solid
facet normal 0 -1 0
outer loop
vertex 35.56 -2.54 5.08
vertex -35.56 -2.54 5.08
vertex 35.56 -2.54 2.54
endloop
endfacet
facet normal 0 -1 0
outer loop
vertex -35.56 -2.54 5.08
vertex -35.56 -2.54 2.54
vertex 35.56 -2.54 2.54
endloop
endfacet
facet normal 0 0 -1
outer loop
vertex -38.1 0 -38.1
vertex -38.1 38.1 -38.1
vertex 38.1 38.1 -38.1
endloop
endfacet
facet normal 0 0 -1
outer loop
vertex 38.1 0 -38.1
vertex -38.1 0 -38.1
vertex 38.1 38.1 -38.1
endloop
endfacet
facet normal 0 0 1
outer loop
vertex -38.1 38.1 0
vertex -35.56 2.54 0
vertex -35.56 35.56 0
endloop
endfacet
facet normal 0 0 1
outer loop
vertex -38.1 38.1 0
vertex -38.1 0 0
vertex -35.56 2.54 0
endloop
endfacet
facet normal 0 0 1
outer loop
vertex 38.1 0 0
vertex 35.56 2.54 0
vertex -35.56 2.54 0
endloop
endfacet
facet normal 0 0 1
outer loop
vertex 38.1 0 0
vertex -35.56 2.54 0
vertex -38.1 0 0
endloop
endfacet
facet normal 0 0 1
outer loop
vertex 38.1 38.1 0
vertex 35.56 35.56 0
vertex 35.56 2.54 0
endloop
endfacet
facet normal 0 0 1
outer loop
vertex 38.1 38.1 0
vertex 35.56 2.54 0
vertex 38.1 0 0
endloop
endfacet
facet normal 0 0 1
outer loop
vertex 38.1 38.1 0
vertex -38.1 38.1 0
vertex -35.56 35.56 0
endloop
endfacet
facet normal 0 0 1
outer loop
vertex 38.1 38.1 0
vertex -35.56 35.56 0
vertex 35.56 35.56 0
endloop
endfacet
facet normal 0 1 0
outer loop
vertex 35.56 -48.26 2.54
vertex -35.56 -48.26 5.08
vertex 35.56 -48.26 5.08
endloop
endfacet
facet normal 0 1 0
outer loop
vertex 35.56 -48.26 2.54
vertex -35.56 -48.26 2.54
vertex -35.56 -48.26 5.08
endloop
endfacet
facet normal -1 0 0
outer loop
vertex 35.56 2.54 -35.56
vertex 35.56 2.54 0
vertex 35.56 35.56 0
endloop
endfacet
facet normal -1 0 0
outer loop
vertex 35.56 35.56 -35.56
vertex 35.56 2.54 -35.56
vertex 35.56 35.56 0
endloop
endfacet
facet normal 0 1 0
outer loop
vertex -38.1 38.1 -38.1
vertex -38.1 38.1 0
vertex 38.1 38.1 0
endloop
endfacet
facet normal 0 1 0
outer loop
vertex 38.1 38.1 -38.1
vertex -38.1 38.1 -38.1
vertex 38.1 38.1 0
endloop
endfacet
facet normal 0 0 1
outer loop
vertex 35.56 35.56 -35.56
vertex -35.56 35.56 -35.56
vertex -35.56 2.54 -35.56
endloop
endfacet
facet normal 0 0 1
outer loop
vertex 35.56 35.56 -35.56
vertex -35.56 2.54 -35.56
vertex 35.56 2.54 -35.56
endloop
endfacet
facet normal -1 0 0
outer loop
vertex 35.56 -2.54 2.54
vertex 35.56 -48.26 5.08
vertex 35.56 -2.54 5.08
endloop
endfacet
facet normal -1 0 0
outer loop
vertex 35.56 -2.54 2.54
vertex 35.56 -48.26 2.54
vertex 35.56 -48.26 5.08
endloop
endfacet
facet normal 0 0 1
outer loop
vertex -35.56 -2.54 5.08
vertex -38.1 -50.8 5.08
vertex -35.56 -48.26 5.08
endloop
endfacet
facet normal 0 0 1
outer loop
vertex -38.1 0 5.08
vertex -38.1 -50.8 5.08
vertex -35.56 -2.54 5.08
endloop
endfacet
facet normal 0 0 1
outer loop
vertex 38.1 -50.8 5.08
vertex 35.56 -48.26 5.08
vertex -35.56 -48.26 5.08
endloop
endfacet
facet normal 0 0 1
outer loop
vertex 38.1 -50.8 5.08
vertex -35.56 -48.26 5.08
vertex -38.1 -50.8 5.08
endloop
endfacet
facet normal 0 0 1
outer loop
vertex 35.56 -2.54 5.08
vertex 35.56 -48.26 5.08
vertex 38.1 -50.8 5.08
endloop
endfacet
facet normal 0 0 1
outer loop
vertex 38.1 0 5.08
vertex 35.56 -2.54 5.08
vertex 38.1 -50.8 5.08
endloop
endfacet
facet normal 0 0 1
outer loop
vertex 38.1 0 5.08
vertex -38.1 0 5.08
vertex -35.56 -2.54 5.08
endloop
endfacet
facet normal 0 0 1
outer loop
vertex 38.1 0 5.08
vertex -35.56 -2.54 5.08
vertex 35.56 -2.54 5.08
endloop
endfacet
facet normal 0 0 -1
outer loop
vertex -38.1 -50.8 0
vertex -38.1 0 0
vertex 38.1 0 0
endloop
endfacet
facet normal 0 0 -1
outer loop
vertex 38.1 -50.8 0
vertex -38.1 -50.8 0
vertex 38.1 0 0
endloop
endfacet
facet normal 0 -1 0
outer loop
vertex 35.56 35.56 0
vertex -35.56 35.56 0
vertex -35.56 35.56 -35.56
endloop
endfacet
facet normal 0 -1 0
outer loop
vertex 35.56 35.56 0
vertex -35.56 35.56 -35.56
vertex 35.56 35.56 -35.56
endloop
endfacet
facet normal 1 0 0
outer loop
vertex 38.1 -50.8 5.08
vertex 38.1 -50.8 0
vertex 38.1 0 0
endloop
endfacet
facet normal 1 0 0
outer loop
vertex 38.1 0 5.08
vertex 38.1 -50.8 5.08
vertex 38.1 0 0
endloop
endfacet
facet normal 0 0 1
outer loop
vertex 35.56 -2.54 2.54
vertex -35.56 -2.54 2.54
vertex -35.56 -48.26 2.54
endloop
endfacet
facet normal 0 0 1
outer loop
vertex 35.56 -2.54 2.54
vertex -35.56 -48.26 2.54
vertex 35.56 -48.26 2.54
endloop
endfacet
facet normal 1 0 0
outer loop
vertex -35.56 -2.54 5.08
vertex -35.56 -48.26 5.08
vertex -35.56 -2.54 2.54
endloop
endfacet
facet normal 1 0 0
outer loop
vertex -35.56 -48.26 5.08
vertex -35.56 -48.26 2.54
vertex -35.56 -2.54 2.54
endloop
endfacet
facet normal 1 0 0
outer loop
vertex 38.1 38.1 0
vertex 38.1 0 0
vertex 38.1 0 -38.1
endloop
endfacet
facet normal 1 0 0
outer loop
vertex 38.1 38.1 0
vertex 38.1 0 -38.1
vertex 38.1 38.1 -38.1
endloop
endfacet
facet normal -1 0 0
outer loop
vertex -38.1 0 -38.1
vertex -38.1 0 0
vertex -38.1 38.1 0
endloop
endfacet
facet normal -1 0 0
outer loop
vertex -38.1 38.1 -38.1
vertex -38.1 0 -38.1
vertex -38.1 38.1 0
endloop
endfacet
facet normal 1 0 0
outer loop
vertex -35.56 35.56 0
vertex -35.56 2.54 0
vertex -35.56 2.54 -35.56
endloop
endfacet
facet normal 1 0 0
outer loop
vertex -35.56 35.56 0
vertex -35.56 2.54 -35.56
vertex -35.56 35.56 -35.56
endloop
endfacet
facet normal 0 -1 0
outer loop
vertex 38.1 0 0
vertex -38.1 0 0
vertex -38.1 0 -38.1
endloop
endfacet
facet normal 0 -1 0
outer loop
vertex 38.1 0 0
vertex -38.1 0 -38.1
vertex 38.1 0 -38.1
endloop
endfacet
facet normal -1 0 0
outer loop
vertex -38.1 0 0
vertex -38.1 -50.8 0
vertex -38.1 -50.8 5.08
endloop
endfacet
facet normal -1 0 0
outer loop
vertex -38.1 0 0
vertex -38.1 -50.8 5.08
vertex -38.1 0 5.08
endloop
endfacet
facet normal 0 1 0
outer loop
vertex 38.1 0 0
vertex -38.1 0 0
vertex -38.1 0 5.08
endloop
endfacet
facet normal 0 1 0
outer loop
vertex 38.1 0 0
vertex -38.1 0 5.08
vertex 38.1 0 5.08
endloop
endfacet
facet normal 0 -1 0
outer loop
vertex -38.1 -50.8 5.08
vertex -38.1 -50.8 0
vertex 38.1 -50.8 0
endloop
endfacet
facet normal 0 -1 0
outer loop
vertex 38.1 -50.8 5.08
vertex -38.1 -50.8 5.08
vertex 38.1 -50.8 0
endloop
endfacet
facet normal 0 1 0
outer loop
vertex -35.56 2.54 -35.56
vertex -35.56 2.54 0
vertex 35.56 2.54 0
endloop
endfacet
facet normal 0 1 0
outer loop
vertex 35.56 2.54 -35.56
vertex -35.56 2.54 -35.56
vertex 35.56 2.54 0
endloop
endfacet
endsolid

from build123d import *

# Parameters (mm, degrees)
F0_W     = 76.2
F0_H     = 50.8
F1_DEPTH = 5.08
F0_H_2   = 38.1
F2_DEPTH = 38.1
F3_T     = -2.54
F3_2_T   = -2.54


with BuildPart() as f1:
    # F0 (on Top) → F1 (new body)
    with BuildSketch(Plane.XY):
        with Locations((0, -25.4)):
            Rectangle(F0_W, F0_H)
    extrude(amount=F1_DEPTH)

    # F3#2
    f3_2_openings = [f1.faces().sort_by_distance(p)[0] for p in [
        (0, -25.4, 5.08),
    ]]
    offset(amount=F3_2_T, openings=f3_2_openings)


with BuildPart() as f2:
    # F0 (on Top) → F2 (new body)
    with BuildSketch(Plane.XY):
        with Locations((0, 19.05)):
            Rectangle(F0_W, F0_H_2)
    extrude(amount=-F2_DEPTH)

    # F3
    f3_openings = [f2.faces().sort_by_distance(p)[0] for p in [
        (0, 19.05, 0),
    ]]
    offset(amount=F3_T, openings=f3_openings)


solid = Compound([f1.part, f2.part])
